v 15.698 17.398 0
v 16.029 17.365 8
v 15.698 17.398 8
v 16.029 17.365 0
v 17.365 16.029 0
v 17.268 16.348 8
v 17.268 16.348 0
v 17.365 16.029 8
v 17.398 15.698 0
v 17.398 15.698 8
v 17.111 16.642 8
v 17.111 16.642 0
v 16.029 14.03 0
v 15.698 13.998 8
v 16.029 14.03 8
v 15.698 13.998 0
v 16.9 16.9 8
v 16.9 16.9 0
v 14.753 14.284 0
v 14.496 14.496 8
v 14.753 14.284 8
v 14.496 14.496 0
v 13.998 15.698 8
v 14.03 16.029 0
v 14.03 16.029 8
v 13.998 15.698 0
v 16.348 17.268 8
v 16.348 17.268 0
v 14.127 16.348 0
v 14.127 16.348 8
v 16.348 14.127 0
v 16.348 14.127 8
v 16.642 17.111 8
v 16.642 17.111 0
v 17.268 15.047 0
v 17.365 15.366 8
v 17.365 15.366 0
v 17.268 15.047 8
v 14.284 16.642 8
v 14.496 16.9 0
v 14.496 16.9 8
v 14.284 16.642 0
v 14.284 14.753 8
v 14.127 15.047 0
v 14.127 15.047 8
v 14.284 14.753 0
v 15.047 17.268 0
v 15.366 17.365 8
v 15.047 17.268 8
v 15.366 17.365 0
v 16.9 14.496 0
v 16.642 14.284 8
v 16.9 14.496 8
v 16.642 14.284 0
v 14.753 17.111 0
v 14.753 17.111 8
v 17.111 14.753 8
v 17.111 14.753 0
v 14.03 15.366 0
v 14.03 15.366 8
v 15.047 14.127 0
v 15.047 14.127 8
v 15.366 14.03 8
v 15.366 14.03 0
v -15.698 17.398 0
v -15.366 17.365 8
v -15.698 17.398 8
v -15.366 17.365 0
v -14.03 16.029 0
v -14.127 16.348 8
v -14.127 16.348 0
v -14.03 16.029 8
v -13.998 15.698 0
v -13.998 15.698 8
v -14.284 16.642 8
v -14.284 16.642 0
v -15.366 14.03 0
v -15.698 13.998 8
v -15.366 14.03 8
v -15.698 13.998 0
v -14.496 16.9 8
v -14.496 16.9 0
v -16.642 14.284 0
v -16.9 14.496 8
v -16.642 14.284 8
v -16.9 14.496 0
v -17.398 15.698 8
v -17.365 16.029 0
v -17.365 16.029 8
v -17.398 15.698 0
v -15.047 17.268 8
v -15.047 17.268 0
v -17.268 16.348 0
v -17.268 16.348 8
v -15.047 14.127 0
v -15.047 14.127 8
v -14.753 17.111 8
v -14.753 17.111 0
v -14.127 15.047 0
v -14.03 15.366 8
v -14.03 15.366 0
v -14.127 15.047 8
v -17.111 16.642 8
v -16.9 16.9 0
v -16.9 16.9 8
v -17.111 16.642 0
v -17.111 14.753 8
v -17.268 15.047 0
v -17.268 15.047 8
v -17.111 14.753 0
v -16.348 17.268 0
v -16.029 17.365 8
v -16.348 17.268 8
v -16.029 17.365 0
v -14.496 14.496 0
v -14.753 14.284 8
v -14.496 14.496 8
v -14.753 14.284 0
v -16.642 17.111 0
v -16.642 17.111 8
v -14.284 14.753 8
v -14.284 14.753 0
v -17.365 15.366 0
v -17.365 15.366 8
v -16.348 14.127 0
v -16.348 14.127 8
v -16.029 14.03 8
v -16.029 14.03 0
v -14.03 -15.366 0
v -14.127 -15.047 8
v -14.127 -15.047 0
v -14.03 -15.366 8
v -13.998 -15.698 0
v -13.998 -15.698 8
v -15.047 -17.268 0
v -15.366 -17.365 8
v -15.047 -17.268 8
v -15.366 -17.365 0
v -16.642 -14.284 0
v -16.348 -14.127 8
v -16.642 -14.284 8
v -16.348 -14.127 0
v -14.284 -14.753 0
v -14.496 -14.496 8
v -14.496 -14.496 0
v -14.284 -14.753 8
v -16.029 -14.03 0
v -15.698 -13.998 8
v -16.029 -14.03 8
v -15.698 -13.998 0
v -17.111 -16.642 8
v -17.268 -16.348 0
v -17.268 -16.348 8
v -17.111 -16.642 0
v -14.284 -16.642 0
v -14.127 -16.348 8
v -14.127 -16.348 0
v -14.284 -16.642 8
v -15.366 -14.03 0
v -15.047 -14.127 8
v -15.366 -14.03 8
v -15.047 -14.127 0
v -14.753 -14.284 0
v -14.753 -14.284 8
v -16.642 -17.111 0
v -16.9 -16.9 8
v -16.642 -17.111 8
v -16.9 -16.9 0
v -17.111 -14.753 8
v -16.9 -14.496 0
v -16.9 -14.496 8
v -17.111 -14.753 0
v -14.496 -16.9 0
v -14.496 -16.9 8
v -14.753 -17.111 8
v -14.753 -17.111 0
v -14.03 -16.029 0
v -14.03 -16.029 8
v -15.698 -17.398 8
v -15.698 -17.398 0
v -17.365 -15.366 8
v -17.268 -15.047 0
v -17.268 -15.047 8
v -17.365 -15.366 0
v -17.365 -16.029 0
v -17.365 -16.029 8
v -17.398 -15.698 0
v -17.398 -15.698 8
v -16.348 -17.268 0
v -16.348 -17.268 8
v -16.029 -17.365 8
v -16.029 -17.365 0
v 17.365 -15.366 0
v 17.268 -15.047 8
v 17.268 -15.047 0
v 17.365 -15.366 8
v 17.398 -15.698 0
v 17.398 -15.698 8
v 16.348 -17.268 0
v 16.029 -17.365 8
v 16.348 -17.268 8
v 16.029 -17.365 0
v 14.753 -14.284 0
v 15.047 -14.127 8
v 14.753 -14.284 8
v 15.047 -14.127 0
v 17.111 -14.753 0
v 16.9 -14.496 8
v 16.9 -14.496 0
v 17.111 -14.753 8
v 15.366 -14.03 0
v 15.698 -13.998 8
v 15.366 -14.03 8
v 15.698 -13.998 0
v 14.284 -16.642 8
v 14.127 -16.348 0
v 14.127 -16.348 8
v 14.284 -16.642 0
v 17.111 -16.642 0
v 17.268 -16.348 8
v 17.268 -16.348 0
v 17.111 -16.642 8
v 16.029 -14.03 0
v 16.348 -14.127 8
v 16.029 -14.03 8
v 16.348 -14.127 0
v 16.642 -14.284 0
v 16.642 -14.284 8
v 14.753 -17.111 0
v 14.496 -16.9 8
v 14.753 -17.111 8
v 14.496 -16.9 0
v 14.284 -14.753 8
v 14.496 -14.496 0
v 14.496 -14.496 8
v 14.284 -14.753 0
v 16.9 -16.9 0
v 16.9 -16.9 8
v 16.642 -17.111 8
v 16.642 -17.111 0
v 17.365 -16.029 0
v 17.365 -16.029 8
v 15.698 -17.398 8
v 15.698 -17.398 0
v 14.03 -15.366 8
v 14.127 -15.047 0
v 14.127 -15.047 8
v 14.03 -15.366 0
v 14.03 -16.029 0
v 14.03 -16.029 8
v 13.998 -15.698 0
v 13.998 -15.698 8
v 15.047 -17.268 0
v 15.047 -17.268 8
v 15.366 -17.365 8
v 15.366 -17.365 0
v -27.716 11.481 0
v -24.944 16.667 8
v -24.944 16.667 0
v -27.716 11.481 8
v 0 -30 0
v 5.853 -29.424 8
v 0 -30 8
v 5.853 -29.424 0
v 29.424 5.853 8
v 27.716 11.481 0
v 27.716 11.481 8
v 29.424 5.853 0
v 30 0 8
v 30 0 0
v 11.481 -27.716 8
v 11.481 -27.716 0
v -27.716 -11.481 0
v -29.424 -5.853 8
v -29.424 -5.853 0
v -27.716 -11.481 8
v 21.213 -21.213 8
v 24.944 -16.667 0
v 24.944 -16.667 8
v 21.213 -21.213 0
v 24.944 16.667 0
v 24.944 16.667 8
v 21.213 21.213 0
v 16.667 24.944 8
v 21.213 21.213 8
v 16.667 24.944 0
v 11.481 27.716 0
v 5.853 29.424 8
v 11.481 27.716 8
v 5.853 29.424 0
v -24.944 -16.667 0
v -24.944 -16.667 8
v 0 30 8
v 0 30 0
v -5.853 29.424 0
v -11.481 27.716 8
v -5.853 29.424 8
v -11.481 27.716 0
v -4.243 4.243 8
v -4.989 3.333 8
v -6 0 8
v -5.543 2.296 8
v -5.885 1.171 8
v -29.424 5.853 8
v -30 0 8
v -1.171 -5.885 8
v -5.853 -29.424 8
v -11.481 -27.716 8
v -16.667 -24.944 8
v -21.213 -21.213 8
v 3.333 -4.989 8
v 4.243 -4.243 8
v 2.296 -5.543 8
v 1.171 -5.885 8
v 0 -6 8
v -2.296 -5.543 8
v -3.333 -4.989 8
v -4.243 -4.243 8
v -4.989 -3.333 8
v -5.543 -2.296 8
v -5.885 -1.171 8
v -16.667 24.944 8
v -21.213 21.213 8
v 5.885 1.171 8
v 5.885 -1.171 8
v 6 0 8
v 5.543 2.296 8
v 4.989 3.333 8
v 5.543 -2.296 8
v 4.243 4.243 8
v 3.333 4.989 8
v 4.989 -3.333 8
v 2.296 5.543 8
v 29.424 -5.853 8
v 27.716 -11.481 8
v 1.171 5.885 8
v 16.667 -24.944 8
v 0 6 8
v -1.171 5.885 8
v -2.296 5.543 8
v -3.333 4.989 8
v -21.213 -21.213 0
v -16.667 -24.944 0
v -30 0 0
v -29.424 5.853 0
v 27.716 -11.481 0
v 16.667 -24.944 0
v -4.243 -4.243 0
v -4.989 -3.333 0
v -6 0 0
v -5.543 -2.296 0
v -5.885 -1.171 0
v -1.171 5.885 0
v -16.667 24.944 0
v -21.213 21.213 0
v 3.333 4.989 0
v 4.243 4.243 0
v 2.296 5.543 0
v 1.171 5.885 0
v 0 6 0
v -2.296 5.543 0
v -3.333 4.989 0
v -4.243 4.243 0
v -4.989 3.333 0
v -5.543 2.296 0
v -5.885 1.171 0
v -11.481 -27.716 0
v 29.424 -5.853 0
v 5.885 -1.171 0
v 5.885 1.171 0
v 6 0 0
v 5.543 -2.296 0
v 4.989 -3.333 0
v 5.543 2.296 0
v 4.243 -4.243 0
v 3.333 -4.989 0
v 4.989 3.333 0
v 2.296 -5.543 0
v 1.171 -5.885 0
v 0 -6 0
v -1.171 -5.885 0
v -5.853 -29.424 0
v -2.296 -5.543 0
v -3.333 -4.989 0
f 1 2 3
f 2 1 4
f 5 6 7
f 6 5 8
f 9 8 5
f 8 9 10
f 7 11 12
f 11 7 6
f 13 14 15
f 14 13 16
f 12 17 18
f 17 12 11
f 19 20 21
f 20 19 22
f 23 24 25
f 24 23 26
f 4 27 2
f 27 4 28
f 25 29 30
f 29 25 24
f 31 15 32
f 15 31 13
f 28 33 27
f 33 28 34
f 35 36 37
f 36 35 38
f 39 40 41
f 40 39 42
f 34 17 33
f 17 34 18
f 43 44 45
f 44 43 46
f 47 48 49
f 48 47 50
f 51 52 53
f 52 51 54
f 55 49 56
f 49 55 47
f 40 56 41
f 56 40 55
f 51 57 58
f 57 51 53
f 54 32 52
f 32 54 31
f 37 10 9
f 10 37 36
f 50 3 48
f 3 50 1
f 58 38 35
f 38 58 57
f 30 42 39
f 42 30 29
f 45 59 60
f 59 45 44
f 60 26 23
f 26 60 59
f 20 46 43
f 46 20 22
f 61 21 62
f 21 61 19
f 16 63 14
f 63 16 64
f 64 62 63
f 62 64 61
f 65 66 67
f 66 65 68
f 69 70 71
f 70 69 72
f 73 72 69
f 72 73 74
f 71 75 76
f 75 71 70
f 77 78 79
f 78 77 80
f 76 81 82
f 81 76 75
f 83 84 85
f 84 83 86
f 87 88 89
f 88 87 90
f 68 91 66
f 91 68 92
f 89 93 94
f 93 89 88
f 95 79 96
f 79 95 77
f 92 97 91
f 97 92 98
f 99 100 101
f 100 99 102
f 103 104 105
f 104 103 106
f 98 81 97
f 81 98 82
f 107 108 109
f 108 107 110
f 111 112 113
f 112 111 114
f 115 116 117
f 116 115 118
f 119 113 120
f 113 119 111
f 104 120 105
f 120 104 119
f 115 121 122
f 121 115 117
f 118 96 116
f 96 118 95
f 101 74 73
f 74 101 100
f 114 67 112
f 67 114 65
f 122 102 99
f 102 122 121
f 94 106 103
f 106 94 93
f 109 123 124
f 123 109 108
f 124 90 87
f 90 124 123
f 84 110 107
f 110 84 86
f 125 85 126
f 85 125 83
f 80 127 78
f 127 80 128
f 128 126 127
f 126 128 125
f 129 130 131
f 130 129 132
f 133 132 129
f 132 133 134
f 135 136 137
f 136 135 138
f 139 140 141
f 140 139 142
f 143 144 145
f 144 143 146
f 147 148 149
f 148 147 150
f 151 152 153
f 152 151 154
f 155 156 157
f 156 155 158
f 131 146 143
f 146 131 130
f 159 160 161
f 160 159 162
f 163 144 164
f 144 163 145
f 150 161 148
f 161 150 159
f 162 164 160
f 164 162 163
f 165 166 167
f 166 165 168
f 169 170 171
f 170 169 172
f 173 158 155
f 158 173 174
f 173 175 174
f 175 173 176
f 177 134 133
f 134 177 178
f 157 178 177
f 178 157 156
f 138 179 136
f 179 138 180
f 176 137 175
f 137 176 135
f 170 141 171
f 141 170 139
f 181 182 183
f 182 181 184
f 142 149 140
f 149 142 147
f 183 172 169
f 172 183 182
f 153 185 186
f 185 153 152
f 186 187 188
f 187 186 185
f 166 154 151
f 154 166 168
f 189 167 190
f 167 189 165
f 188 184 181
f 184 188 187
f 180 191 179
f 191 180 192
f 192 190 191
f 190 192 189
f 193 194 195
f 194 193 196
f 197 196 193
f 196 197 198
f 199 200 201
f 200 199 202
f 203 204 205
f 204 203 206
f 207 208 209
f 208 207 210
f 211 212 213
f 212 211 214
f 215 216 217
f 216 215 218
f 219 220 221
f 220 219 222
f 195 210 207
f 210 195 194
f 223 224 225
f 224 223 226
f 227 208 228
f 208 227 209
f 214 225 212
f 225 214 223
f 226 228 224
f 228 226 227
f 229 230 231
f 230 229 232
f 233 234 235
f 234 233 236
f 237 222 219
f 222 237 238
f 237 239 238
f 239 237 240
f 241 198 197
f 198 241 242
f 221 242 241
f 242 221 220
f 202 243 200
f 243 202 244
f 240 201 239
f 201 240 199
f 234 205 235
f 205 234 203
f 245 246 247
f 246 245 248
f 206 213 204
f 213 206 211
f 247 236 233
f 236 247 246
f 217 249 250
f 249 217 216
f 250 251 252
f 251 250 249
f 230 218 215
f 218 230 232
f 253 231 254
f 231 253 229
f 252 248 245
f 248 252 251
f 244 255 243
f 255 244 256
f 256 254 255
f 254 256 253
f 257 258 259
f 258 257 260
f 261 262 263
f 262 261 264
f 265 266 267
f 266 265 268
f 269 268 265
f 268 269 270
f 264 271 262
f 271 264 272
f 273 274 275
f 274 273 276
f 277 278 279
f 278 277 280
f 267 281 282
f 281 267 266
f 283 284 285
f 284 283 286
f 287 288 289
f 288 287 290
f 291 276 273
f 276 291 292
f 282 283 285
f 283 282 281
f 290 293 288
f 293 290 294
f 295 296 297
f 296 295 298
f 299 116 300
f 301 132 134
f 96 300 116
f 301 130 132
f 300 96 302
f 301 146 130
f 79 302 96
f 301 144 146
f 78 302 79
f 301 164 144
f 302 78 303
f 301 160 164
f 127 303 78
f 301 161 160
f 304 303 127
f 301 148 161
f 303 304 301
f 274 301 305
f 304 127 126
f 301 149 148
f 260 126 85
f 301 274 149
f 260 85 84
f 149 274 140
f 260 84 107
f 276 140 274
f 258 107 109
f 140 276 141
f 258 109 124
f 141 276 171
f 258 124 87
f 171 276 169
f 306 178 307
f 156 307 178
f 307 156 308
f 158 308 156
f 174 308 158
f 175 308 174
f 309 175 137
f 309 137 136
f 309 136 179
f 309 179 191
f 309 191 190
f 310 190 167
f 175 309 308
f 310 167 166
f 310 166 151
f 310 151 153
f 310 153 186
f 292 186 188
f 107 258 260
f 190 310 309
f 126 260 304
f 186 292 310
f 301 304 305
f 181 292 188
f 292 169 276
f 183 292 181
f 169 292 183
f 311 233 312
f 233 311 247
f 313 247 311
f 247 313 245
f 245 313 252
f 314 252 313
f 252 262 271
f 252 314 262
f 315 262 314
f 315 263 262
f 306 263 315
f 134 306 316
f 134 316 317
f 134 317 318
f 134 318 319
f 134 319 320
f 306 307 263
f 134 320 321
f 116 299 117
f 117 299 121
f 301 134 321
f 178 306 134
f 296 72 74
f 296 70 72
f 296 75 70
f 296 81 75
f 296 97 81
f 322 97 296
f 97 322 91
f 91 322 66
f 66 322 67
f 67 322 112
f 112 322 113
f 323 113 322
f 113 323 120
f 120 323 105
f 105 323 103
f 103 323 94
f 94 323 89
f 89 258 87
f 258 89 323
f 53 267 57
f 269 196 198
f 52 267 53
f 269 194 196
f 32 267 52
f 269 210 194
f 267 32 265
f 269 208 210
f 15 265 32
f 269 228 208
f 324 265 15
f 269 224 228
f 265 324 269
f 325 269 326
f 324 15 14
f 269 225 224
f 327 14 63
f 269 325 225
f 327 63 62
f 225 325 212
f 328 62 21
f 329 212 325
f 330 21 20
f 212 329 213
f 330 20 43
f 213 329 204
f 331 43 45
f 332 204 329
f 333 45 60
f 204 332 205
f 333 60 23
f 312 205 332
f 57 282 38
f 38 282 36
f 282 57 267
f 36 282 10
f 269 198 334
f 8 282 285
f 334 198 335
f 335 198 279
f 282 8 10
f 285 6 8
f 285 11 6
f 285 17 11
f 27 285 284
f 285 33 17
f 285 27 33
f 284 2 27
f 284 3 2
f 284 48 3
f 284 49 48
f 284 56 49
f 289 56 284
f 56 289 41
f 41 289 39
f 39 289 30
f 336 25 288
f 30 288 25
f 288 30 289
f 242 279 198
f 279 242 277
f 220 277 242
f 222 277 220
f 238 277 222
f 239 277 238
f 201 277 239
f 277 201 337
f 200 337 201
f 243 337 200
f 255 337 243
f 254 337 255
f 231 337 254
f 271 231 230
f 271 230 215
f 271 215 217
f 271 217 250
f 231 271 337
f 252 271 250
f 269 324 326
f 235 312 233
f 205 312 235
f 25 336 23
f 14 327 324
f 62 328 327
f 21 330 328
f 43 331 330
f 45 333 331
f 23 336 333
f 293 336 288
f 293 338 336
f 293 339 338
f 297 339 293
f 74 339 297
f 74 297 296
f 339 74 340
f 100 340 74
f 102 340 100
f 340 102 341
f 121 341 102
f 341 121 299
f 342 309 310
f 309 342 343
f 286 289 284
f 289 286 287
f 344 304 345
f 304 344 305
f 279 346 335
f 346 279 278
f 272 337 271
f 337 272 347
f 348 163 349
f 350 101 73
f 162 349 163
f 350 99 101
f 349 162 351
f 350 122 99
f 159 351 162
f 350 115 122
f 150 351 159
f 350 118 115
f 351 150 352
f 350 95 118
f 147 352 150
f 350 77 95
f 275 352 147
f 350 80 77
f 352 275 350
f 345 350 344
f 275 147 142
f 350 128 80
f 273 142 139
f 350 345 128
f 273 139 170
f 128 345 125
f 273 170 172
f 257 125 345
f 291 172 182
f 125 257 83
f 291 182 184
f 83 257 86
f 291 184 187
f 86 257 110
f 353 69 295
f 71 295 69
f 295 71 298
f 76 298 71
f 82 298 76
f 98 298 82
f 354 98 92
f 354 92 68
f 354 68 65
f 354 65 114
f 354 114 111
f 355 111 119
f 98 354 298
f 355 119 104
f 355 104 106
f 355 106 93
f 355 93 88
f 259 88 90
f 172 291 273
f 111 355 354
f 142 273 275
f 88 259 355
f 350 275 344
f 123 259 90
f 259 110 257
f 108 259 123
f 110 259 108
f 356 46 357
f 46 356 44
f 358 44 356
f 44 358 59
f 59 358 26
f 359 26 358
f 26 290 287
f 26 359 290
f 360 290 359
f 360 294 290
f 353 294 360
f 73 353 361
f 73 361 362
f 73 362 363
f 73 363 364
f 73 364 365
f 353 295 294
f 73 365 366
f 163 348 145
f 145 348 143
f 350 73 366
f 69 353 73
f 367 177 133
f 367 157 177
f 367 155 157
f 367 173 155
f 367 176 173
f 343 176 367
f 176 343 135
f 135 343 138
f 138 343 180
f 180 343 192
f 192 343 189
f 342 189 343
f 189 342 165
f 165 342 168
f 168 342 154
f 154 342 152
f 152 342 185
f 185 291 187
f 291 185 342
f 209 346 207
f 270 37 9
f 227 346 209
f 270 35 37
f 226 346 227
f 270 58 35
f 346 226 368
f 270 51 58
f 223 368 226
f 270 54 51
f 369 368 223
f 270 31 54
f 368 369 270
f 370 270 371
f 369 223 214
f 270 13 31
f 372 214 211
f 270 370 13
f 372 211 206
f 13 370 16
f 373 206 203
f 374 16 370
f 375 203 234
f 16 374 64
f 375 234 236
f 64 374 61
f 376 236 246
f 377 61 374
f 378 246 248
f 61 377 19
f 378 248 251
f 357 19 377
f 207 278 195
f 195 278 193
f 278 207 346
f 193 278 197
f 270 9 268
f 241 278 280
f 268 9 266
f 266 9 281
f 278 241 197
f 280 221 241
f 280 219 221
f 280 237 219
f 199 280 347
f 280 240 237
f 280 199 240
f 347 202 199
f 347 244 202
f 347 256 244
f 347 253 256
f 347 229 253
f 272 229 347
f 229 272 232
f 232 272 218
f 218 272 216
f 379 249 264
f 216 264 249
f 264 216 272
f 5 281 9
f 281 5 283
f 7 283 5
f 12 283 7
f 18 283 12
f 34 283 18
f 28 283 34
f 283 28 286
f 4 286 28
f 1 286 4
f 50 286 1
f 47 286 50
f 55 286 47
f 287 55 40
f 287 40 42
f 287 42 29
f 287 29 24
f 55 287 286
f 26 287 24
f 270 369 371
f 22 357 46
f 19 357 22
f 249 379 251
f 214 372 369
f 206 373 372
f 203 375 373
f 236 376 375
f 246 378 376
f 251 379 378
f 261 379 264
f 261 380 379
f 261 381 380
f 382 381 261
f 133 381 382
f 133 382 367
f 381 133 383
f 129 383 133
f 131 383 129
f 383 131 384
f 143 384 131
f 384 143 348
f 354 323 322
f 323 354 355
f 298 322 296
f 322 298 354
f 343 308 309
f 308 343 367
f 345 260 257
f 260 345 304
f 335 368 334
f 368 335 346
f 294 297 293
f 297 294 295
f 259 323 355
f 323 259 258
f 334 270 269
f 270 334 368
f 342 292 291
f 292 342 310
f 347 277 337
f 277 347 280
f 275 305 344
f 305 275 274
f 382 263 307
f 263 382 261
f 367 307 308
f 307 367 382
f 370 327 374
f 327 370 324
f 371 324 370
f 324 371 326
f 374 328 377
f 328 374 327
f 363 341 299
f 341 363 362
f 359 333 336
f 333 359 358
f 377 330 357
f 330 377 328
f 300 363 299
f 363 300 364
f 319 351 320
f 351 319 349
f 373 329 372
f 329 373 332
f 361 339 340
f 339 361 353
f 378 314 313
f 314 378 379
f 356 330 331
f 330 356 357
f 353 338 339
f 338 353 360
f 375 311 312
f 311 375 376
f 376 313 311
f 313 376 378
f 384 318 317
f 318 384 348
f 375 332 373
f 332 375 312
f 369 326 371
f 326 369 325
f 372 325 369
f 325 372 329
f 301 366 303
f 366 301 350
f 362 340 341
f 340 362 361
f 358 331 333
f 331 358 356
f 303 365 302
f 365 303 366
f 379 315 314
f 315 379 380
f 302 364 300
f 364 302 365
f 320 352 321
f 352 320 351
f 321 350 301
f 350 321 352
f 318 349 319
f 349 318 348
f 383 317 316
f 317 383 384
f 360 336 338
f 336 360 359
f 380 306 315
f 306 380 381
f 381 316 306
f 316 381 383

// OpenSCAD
$fn = 32;

// ----------------------------------------------------------------------
// Flange Ø60 x 8
// 4 holes on a Ø44.4 bolt circle, bolted joints
// ----------------------------------------------------------------------

// --- parameters (mm) ---
flange_d = 60;   // outside diameter of the flange
thickness = 8;   // flange thickness
holes = 4;       // number of bolt holes
pcd = 44.4;      // bolt circle diameter
start_deg = 45;  // angle of the first hole, from +X
hole_d = 3.4;    // bolt hole diameter
bore_d = 12;     // central through bore
hub_d = 22;      // hub outside diameter
hub_h = 0;       // hub height above the flange face (0 = no hub)

// --- derived feature positions (mm) ---
height = thickness + hub_h;  // = 8   overall height of the part
pcd_r = pcd / 2;             // = 22.2   bolt circle radius
hole_step = 360 / holes;     // = 90   angular pitch
feature_centers = [
  [pcd_r * cos(start_deg + 0 * hole_step), pcd_r * sin(start_deg + 0 * hole_step)],
  [pcd_r * cos(start_deg + 1 * hole_step), pcd_r * sin(start_deg + 1 * hole_step)],
  [pcd_r * cos(start_deg + 2 * hole_step), pcd_r * sin(start_deg + 2 * hole_step)],
  [pcd_r * cos(start_deg + 3 * hole_step), pcd_r * sin(start_deg + 3 * hole_step)]
];   // bolt hole centres on the pitch circle

// flange disc, every hole and the bore cut straight through
difference() {
  union() {
    cylinder(d = flange_d, h = thickness);
  }
  translate([0, 0, -1]) cylinder(d = bore_d, h = height + 2);  // bore, through
  for (centre = feature_centers)
    translate([centre[0], centre[1], -1]) cylinder(d = hole_d, h = thickness + 2);
}
